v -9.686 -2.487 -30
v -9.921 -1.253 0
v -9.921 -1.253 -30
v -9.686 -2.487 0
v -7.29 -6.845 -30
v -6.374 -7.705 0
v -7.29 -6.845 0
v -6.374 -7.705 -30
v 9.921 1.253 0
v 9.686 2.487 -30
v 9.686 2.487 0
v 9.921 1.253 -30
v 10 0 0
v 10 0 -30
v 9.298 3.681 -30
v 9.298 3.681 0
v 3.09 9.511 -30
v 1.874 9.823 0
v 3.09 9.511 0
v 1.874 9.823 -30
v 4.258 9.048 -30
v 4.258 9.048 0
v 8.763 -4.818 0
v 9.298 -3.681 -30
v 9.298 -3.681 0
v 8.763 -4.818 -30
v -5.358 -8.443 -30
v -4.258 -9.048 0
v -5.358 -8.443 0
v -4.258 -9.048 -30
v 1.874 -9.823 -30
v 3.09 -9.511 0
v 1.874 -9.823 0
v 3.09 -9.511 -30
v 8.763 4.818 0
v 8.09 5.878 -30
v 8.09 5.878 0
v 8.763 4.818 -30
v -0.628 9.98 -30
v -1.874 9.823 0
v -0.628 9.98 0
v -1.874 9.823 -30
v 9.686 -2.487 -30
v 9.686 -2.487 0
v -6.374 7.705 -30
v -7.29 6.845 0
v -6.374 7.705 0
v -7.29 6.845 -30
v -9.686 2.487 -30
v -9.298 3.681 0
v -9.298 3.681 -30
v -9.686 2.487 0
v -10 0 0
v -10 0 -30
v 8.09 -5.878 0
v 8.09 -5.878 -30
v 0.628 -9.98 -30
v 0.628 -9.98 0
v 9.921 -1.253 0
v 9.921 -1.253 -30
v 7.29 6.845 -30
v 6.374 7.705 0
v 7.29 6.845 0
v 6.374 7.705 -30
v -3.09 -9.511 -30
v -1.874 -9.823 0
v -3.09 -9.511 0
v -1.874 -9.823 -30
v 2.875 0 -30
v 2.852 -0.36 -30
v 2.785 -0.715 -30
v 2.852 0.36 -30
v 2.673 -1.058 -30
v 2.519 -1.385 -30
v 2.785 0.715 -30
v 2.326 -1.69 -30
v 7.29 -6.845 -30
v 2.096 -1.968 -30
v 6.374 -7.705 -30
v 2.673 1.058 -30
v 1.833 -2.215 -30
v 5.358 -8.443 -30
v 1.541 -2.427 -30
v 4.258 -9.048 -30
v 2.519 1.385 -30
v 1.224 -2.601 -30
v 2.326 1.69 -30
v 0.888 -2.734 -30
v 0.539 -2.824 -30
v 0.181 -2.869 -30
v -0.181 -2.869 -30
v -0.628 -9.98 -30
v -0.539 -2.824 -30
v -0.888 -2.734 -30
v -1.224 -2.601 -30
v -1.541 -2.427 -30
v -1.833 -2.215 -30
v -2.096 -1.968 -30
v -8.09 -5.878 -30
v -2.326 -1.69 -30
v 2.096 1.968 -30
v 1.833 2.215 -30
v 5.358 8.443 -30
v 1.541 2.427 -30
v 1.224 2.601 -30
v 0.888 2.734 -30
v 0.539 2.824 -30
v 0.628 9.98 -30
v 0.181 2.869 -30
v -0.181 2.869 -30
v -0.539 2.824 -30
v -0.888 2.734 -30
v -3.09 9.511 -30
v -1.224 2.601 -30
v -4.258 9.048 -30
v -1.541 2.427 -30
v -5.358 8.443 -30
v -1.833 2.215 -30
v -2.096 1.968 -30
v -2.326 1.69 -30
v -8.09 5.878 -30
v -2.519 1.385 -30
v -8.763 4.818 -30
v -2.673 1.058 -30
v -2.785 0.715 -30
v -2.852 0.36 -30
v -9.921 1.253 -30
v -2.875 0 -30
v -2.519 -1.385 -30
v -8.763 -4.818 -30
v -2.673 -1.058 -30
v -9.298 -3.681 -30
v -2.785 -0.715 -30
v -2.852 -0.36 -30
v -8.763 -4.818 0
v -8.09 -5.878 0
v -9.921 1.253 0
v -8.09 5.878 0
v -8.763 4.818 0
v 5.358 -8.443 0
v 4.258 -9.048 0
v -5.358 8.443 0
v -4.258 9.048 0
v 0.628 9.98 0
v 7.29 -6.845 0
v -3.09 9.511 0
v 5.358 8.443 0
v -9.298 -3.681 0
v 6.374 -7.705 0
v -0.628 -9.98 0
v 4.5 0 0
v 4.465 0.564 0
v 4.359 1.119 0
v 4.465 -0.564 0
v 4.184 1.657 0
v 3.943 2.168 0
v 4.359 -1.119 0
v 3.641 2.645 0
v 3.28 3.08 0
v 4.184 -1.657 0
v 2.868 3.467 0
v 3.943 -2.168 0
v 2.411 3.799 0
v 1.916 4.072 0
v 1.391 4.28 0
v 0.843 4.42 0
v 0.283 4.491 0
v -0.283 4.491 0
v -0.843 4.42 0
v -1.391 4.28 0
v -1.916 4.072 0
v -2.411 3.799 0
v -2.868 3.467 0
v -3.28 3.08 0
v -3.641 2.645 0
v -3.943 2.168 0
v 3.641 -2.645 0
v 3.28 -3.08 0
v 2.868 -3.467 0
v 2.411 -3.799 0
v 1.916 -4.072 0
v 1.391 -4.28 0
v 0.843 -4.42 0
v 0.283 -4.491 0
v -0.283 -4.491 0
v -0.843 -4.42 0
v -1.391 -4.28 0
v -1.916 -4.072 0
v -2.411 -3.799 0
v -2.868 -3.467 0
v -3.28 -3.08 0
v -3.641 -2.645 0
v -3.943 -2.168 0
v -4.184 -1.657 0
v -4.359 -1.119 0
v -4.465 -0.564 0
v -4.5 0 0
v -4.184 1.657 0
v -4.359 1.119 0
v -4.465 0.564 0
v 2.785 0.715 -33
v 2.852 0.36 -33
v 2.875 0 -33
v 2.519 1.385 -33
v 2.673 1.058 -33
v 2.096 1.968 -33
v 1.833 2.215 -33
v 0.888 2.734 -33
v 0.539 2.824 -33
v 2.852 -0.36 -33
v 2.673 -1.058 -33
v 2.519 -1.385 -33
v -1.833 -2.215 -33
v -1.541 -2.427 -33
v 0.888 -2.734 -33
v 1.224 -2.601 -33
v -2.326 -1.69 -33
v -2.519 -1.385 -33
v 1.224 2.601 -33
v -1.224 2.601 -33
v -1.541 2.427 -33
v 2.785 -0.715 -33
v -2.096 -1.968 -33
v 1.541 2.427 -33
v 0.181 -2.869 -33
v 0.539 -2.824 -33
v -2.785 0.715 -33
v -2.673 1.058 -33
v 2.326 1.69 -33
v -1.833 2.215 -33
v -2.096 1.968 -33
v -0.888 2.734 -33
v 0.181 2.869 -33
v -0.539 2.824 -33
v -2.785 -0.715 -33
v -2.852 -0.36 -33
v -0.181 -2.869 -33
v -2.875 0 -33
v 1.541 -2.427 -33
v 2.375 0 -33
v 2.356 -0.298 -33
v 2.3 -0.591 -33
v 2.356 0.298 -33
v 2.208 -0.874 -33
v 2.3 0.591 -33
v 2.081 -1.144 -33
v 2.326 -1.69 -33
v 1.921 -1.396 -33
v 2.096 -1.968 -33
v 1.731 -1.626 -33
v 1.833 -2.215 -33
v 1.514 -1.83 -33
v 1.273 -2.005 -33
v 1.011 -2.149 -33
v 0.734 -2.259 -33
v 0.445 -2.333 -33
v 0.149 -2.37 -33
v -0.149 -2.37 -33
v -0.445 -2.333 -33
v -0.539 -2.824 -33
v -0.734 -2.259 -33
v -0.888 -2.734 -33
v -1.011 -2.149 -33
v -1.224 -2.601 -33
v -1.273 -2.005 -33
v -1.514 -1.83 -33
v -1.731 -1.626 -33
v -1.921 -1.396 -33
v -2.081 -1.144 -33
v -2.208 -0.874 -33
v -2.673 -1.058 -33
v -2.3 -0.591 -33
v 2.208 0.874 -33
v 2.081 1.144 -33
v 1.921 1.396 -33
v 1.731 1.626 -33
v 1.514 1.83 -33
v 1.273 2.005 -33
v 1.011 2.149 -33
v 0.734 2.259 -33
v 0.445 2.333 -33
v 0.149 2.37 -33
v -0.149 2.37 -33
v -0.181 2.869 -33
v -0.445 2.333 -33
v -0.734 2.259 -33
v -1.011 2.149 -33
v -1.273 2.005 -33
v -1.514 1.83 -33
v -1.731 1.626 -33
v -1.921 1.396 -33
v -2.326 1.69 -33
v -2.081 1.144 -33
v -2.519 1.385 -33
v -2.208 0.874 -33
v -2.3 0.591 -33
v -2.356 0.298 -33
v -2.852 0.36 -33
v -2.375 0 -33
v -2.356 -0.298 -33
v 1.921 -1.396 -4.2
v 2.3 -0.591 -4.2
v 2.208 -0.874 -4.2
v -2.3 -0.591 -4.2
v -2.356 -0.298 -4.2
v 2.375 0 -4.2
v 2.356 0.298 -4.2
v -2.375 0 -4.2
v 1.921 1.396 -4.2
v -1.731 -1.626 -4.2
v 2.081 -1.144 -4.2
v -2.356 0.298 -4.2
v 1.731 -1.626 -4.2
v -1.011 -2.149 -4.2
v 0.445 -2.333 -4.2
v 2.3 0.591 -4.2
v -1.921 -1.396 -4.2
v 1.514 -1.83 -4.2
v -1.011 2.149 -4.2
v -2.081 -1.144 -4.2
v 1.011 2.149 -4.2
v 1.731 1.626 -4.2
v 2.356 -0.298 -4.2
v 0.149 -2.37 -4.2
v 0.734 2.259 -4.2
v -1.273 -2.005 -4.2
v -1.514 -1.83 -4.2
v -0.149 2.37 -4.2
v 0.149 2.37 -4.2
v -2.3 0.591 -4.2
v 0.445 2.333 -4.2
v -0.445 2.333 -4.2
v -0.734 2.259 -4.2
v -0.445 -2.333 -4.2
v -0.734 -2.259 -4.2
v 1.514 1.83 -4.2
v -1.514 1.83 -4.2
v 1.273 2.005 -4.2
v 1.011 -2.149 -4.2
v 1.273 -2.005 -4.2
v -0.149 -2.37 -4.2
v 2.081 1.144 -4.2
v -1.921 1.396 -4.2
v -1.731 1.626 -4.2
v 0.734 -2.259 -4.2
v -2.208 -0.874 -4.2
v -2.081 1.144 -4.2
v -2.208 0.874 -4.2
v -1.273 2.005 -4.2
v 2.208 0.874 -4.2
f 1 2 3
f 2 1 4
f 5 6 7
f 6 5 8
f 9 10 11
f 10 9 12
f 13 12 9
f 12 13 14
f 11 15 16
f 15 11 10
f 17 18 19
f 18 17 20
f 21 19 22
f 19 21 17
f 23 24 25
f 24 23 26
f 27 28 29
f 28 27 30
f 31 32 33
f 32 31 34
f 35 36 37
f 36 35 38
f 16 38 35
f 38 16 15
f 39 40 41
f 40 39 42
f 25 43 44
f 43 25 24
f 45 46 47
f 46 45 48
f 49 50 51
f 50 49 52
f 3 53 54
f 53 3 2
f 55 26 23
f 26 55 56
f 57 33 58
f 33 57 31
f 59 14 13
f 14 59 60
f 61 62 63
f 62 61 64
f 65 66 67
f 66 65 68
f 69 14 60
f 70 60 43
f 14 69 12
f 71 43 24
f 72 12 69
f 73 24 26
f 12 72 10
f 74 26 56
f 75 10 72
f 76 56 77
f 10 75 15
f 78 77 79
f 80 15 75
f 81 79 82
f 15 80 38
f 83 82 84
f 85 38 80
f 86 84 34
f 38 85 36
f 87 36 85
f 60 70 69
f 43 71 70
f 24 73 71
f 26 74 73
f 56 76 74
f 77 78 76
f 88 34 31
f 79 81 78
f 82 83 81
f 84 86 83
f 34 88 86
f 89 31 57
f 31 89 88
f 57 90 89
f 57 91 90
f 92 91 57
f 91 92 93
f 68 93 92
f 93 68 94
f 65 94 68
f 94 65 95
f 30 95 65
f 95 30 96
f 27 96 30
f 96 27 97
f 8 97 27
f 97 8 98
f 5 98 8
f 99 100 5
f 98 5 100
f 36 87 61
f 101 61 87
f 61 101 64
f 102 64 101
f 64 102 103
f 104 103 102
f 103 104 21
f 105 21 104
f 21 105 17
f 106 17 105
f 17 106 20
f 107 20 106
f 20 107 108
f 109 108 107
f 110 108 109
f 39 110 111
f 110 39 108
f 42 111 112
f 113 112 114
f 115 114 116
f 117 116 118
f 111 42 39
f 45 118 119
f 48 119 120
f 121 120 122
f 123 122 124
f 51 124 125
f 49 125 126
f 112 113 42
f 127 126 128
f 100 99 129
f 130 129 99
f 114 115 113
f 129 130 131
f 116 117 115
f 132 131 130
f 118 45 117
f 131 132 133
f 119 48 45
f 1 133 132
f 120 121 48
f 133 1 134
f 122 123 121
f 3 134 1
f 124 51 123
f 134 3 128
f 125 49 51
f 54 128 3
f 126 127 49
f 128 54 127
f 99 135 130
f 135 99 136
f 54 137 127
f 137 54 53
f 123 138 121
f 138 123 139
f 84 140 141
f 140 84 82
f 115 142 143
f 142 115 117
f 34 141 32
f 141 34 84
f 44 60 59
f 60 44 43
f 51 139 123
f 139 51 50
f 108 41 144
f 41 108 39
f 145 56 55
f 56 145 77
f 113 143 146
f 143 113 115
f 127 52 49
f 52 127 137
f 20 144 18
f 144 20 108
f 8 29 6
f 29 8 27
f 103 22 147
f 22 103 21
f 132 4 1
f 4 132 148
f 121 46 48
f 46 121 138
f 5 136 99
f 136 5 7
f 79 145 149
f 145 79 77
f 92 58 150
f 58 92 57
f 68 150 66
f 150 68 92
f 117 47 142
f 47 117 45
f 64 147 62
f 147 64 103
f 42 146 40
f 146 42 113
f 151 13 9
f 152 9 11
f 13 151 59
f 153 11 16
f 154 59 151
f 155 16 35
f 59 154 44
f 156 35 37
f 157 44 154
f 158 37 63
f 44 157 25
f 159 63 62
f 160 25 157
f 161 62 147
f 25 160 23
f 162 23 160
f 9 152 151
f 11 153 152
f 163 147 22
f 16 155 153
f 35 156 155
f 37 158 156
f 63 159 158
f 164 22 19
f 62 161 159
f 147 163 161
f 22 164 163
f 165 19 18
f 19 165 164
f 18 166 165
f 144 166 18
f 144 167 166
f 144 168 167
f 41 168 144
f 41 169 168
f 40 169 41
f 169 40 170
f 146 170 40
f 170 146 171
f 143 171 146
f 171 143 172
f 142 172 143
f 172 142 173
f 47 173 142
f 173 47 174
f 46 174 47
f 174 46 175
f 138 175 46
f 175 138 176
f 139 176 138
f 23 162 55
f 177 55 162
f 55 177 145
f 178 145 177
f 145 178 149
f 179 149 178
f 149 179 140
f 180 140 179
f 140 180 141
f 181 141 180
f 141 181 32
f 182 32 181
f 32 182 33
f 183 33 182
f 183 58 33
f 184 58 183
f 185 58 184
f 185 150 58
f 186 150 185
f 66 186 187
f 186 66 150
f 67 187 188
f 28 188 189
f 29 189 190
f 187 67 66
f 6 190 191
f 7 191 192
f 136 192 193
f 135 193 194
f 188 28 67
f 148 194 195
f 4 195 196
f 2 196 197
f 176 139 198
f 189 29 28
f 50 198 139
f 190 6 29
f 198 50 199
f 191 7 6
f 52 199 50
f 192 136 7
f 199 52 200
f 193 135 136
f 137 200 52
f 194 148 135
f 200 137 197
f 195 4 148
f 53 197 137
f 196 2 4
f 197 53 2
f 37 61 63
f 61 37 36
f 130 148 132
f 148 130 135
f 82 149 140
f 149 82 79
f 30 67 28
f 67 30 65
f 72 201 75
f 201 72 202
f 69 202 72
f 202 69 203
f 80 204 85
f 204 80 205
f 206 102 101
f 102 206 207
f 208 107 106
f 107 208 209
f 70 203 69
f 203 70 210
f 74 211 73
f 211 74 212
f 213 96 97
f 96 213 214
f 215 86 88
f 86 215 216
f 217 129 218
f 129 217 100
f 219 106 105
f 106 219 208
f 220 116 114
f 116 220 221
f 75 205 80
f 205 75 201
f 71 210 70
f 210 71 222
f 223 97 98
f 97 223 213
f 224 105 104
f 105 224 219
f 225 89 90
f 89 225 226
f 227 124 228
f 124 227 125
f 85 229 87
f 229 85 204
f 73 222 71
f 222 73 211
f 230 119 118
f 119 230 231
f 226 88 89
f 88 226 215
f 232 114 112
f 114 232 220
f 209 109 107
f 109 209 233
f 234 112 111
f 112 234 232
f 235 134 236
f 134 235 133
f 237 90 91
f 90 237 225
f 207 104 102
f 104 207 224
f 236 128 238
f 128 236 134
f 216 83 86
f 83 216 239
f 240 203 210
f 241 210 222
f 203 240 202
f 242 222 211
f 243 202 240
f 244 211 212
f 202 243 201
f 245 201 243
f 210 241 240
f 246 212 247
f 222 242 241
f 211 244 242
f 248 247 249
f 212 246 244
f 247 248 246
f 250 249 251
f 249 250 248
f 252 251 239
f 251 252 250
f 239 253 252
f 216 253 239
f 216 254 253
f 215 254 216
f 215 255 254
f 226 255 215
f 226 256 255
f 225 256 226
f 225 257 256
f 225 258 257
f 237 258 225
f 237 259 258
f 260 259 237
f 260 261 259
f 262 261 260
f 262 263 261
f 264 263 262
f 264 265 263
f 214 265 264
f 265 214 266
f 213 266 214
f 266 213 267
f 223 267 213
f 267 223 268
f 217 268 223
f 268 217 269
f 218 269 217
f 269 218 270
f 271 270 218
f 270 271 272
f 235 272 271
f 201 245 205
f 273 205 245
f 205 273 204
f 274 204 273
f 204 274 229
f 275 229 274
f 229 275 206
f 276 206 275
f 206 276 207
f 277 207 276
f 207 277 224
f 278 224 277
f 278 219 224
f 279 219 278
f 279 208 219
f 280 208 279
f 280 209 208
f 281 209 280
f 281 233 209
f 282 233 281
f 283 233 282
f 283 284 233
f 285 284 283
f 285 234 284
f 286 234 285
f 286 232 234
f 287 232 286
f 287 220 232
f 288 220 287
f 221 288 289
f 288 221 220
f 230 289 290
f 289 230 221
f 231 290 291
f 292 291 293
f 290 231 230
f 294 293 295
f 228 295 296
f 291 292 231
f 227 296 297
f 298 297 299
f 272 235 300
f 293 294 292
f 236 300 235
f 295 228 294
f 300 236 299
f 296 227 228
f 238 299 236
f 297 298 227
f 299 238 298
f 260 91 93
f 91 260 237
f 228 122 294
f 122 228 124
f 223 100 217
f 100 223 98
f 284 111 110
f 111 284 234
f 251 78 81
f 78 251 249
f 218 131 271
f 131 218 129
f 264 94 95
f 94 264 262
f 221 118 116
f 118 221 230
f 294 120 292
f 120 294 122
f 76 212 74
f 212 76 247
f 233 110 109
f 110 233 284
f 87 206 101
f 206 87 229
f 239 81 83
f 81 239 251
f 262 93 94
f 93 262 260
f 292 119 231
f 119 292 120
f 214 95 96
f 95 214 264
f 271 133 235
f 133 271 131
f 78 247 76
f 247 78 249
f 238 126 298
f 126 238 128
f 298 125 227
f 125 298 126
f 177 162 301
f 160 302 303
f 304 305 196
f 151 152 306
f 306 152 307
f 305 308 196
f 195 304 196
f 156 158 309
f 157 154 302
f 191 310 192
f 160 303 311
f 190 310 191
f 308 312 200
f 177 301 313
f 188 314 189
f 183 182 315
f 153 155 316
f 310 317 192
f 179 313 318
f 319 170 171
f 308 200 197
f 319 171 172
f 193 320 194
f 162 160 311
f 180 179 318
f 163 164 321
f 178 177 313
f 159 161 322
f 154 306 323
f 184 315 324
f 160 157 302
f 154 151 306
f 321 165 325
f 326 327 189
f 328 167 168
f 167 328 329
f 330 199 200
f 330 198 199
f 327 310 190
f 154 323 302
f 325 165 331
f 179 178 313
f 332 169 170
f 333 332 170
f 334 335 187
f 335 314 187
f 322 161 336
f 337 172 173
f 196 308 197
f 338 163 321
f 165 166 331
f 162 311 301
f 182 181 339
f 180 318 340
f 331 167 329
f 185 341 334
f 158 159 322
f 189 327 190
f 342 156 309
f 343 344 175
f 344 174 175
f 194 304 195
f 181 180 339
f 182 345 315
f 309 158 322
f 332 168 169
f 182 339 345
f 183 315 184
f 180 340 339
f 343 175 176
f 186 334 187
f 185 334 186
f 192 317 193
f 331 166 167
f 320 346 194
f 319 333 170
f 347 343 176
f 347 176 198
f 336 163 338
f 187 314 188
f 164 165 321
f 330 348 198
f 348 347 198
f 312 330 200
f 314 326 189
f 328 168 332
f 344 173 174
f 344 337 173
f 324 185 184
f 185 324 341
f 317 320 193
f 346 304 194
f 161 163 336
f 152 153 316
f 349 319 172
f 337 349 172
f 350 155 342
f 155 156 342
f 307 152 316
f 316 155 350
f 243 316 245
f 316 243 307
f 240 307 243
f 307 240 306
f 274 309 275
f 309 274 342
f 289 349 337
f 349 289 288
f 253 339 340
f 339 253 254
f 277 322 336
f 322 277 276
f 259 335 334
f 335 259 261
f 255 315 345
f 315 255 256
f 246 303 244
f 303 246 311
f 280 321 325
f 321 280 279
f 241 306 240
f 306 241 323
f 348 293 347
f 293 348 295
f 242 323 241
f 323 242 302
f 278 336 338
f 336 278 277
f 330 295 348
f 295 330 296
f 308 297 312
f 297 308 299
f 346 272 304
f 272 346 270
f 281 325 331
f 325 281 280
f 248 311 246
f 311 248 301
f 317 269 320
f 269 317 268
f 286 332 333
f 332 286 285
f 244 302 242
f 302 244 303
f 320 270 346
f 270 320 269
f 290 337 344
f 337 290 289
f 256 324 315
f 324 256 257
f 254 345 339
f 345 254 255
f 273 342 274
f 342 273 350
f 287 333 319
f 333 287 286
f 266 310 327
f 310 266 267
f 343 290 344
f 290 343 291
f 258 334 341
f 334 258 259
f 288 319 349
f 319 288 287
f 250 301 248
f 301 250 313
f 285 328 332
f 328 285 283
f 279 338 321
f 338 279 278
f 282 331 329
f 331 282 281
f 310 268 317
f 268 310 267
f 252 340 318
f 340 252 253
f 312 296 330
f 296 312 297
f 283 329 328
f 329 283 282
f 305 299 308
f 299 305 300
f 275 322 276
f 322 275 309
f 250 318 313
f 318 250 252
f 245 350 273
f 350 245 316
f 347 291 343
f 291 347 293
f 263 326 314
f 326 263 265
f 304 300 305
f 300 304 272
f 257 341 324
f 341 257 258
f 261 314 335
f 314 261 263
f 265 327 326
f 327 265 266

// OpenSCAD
$fn = 50;

difference() {
	union() {
		translate(v = [0, 0, -30.0]) {
			cylinder(h = 30, r = 10.0);
		}
		#translate(v = [0, 0, -33.0]) {
			cylinder(h = 33, r = 2.875);
		}
	}
	union() {
		translate(v = [0, 0, 0]) {
			rotate(a = [0, 0, 0]) {
				difference() {
					union() {
						translate(v = [0, 0, -33.0]) {
							cylinder(h = 33, r = 2.25);
						}
						translate(v = [0, 0, -4.2]) {
							cylinder(h = 4.2, r1 = 2.375, r2 = 4.5);
						}
						translate(v = [0, 0, -33.0]) {
							cylinder(h = 33, r = 2.375);
						}
						translate(v = [0, 0, -33.0]) {
							cylinder(h = 33, r = 2.25);
						}
					}
					union();
				}
			}
		}
	}
}
